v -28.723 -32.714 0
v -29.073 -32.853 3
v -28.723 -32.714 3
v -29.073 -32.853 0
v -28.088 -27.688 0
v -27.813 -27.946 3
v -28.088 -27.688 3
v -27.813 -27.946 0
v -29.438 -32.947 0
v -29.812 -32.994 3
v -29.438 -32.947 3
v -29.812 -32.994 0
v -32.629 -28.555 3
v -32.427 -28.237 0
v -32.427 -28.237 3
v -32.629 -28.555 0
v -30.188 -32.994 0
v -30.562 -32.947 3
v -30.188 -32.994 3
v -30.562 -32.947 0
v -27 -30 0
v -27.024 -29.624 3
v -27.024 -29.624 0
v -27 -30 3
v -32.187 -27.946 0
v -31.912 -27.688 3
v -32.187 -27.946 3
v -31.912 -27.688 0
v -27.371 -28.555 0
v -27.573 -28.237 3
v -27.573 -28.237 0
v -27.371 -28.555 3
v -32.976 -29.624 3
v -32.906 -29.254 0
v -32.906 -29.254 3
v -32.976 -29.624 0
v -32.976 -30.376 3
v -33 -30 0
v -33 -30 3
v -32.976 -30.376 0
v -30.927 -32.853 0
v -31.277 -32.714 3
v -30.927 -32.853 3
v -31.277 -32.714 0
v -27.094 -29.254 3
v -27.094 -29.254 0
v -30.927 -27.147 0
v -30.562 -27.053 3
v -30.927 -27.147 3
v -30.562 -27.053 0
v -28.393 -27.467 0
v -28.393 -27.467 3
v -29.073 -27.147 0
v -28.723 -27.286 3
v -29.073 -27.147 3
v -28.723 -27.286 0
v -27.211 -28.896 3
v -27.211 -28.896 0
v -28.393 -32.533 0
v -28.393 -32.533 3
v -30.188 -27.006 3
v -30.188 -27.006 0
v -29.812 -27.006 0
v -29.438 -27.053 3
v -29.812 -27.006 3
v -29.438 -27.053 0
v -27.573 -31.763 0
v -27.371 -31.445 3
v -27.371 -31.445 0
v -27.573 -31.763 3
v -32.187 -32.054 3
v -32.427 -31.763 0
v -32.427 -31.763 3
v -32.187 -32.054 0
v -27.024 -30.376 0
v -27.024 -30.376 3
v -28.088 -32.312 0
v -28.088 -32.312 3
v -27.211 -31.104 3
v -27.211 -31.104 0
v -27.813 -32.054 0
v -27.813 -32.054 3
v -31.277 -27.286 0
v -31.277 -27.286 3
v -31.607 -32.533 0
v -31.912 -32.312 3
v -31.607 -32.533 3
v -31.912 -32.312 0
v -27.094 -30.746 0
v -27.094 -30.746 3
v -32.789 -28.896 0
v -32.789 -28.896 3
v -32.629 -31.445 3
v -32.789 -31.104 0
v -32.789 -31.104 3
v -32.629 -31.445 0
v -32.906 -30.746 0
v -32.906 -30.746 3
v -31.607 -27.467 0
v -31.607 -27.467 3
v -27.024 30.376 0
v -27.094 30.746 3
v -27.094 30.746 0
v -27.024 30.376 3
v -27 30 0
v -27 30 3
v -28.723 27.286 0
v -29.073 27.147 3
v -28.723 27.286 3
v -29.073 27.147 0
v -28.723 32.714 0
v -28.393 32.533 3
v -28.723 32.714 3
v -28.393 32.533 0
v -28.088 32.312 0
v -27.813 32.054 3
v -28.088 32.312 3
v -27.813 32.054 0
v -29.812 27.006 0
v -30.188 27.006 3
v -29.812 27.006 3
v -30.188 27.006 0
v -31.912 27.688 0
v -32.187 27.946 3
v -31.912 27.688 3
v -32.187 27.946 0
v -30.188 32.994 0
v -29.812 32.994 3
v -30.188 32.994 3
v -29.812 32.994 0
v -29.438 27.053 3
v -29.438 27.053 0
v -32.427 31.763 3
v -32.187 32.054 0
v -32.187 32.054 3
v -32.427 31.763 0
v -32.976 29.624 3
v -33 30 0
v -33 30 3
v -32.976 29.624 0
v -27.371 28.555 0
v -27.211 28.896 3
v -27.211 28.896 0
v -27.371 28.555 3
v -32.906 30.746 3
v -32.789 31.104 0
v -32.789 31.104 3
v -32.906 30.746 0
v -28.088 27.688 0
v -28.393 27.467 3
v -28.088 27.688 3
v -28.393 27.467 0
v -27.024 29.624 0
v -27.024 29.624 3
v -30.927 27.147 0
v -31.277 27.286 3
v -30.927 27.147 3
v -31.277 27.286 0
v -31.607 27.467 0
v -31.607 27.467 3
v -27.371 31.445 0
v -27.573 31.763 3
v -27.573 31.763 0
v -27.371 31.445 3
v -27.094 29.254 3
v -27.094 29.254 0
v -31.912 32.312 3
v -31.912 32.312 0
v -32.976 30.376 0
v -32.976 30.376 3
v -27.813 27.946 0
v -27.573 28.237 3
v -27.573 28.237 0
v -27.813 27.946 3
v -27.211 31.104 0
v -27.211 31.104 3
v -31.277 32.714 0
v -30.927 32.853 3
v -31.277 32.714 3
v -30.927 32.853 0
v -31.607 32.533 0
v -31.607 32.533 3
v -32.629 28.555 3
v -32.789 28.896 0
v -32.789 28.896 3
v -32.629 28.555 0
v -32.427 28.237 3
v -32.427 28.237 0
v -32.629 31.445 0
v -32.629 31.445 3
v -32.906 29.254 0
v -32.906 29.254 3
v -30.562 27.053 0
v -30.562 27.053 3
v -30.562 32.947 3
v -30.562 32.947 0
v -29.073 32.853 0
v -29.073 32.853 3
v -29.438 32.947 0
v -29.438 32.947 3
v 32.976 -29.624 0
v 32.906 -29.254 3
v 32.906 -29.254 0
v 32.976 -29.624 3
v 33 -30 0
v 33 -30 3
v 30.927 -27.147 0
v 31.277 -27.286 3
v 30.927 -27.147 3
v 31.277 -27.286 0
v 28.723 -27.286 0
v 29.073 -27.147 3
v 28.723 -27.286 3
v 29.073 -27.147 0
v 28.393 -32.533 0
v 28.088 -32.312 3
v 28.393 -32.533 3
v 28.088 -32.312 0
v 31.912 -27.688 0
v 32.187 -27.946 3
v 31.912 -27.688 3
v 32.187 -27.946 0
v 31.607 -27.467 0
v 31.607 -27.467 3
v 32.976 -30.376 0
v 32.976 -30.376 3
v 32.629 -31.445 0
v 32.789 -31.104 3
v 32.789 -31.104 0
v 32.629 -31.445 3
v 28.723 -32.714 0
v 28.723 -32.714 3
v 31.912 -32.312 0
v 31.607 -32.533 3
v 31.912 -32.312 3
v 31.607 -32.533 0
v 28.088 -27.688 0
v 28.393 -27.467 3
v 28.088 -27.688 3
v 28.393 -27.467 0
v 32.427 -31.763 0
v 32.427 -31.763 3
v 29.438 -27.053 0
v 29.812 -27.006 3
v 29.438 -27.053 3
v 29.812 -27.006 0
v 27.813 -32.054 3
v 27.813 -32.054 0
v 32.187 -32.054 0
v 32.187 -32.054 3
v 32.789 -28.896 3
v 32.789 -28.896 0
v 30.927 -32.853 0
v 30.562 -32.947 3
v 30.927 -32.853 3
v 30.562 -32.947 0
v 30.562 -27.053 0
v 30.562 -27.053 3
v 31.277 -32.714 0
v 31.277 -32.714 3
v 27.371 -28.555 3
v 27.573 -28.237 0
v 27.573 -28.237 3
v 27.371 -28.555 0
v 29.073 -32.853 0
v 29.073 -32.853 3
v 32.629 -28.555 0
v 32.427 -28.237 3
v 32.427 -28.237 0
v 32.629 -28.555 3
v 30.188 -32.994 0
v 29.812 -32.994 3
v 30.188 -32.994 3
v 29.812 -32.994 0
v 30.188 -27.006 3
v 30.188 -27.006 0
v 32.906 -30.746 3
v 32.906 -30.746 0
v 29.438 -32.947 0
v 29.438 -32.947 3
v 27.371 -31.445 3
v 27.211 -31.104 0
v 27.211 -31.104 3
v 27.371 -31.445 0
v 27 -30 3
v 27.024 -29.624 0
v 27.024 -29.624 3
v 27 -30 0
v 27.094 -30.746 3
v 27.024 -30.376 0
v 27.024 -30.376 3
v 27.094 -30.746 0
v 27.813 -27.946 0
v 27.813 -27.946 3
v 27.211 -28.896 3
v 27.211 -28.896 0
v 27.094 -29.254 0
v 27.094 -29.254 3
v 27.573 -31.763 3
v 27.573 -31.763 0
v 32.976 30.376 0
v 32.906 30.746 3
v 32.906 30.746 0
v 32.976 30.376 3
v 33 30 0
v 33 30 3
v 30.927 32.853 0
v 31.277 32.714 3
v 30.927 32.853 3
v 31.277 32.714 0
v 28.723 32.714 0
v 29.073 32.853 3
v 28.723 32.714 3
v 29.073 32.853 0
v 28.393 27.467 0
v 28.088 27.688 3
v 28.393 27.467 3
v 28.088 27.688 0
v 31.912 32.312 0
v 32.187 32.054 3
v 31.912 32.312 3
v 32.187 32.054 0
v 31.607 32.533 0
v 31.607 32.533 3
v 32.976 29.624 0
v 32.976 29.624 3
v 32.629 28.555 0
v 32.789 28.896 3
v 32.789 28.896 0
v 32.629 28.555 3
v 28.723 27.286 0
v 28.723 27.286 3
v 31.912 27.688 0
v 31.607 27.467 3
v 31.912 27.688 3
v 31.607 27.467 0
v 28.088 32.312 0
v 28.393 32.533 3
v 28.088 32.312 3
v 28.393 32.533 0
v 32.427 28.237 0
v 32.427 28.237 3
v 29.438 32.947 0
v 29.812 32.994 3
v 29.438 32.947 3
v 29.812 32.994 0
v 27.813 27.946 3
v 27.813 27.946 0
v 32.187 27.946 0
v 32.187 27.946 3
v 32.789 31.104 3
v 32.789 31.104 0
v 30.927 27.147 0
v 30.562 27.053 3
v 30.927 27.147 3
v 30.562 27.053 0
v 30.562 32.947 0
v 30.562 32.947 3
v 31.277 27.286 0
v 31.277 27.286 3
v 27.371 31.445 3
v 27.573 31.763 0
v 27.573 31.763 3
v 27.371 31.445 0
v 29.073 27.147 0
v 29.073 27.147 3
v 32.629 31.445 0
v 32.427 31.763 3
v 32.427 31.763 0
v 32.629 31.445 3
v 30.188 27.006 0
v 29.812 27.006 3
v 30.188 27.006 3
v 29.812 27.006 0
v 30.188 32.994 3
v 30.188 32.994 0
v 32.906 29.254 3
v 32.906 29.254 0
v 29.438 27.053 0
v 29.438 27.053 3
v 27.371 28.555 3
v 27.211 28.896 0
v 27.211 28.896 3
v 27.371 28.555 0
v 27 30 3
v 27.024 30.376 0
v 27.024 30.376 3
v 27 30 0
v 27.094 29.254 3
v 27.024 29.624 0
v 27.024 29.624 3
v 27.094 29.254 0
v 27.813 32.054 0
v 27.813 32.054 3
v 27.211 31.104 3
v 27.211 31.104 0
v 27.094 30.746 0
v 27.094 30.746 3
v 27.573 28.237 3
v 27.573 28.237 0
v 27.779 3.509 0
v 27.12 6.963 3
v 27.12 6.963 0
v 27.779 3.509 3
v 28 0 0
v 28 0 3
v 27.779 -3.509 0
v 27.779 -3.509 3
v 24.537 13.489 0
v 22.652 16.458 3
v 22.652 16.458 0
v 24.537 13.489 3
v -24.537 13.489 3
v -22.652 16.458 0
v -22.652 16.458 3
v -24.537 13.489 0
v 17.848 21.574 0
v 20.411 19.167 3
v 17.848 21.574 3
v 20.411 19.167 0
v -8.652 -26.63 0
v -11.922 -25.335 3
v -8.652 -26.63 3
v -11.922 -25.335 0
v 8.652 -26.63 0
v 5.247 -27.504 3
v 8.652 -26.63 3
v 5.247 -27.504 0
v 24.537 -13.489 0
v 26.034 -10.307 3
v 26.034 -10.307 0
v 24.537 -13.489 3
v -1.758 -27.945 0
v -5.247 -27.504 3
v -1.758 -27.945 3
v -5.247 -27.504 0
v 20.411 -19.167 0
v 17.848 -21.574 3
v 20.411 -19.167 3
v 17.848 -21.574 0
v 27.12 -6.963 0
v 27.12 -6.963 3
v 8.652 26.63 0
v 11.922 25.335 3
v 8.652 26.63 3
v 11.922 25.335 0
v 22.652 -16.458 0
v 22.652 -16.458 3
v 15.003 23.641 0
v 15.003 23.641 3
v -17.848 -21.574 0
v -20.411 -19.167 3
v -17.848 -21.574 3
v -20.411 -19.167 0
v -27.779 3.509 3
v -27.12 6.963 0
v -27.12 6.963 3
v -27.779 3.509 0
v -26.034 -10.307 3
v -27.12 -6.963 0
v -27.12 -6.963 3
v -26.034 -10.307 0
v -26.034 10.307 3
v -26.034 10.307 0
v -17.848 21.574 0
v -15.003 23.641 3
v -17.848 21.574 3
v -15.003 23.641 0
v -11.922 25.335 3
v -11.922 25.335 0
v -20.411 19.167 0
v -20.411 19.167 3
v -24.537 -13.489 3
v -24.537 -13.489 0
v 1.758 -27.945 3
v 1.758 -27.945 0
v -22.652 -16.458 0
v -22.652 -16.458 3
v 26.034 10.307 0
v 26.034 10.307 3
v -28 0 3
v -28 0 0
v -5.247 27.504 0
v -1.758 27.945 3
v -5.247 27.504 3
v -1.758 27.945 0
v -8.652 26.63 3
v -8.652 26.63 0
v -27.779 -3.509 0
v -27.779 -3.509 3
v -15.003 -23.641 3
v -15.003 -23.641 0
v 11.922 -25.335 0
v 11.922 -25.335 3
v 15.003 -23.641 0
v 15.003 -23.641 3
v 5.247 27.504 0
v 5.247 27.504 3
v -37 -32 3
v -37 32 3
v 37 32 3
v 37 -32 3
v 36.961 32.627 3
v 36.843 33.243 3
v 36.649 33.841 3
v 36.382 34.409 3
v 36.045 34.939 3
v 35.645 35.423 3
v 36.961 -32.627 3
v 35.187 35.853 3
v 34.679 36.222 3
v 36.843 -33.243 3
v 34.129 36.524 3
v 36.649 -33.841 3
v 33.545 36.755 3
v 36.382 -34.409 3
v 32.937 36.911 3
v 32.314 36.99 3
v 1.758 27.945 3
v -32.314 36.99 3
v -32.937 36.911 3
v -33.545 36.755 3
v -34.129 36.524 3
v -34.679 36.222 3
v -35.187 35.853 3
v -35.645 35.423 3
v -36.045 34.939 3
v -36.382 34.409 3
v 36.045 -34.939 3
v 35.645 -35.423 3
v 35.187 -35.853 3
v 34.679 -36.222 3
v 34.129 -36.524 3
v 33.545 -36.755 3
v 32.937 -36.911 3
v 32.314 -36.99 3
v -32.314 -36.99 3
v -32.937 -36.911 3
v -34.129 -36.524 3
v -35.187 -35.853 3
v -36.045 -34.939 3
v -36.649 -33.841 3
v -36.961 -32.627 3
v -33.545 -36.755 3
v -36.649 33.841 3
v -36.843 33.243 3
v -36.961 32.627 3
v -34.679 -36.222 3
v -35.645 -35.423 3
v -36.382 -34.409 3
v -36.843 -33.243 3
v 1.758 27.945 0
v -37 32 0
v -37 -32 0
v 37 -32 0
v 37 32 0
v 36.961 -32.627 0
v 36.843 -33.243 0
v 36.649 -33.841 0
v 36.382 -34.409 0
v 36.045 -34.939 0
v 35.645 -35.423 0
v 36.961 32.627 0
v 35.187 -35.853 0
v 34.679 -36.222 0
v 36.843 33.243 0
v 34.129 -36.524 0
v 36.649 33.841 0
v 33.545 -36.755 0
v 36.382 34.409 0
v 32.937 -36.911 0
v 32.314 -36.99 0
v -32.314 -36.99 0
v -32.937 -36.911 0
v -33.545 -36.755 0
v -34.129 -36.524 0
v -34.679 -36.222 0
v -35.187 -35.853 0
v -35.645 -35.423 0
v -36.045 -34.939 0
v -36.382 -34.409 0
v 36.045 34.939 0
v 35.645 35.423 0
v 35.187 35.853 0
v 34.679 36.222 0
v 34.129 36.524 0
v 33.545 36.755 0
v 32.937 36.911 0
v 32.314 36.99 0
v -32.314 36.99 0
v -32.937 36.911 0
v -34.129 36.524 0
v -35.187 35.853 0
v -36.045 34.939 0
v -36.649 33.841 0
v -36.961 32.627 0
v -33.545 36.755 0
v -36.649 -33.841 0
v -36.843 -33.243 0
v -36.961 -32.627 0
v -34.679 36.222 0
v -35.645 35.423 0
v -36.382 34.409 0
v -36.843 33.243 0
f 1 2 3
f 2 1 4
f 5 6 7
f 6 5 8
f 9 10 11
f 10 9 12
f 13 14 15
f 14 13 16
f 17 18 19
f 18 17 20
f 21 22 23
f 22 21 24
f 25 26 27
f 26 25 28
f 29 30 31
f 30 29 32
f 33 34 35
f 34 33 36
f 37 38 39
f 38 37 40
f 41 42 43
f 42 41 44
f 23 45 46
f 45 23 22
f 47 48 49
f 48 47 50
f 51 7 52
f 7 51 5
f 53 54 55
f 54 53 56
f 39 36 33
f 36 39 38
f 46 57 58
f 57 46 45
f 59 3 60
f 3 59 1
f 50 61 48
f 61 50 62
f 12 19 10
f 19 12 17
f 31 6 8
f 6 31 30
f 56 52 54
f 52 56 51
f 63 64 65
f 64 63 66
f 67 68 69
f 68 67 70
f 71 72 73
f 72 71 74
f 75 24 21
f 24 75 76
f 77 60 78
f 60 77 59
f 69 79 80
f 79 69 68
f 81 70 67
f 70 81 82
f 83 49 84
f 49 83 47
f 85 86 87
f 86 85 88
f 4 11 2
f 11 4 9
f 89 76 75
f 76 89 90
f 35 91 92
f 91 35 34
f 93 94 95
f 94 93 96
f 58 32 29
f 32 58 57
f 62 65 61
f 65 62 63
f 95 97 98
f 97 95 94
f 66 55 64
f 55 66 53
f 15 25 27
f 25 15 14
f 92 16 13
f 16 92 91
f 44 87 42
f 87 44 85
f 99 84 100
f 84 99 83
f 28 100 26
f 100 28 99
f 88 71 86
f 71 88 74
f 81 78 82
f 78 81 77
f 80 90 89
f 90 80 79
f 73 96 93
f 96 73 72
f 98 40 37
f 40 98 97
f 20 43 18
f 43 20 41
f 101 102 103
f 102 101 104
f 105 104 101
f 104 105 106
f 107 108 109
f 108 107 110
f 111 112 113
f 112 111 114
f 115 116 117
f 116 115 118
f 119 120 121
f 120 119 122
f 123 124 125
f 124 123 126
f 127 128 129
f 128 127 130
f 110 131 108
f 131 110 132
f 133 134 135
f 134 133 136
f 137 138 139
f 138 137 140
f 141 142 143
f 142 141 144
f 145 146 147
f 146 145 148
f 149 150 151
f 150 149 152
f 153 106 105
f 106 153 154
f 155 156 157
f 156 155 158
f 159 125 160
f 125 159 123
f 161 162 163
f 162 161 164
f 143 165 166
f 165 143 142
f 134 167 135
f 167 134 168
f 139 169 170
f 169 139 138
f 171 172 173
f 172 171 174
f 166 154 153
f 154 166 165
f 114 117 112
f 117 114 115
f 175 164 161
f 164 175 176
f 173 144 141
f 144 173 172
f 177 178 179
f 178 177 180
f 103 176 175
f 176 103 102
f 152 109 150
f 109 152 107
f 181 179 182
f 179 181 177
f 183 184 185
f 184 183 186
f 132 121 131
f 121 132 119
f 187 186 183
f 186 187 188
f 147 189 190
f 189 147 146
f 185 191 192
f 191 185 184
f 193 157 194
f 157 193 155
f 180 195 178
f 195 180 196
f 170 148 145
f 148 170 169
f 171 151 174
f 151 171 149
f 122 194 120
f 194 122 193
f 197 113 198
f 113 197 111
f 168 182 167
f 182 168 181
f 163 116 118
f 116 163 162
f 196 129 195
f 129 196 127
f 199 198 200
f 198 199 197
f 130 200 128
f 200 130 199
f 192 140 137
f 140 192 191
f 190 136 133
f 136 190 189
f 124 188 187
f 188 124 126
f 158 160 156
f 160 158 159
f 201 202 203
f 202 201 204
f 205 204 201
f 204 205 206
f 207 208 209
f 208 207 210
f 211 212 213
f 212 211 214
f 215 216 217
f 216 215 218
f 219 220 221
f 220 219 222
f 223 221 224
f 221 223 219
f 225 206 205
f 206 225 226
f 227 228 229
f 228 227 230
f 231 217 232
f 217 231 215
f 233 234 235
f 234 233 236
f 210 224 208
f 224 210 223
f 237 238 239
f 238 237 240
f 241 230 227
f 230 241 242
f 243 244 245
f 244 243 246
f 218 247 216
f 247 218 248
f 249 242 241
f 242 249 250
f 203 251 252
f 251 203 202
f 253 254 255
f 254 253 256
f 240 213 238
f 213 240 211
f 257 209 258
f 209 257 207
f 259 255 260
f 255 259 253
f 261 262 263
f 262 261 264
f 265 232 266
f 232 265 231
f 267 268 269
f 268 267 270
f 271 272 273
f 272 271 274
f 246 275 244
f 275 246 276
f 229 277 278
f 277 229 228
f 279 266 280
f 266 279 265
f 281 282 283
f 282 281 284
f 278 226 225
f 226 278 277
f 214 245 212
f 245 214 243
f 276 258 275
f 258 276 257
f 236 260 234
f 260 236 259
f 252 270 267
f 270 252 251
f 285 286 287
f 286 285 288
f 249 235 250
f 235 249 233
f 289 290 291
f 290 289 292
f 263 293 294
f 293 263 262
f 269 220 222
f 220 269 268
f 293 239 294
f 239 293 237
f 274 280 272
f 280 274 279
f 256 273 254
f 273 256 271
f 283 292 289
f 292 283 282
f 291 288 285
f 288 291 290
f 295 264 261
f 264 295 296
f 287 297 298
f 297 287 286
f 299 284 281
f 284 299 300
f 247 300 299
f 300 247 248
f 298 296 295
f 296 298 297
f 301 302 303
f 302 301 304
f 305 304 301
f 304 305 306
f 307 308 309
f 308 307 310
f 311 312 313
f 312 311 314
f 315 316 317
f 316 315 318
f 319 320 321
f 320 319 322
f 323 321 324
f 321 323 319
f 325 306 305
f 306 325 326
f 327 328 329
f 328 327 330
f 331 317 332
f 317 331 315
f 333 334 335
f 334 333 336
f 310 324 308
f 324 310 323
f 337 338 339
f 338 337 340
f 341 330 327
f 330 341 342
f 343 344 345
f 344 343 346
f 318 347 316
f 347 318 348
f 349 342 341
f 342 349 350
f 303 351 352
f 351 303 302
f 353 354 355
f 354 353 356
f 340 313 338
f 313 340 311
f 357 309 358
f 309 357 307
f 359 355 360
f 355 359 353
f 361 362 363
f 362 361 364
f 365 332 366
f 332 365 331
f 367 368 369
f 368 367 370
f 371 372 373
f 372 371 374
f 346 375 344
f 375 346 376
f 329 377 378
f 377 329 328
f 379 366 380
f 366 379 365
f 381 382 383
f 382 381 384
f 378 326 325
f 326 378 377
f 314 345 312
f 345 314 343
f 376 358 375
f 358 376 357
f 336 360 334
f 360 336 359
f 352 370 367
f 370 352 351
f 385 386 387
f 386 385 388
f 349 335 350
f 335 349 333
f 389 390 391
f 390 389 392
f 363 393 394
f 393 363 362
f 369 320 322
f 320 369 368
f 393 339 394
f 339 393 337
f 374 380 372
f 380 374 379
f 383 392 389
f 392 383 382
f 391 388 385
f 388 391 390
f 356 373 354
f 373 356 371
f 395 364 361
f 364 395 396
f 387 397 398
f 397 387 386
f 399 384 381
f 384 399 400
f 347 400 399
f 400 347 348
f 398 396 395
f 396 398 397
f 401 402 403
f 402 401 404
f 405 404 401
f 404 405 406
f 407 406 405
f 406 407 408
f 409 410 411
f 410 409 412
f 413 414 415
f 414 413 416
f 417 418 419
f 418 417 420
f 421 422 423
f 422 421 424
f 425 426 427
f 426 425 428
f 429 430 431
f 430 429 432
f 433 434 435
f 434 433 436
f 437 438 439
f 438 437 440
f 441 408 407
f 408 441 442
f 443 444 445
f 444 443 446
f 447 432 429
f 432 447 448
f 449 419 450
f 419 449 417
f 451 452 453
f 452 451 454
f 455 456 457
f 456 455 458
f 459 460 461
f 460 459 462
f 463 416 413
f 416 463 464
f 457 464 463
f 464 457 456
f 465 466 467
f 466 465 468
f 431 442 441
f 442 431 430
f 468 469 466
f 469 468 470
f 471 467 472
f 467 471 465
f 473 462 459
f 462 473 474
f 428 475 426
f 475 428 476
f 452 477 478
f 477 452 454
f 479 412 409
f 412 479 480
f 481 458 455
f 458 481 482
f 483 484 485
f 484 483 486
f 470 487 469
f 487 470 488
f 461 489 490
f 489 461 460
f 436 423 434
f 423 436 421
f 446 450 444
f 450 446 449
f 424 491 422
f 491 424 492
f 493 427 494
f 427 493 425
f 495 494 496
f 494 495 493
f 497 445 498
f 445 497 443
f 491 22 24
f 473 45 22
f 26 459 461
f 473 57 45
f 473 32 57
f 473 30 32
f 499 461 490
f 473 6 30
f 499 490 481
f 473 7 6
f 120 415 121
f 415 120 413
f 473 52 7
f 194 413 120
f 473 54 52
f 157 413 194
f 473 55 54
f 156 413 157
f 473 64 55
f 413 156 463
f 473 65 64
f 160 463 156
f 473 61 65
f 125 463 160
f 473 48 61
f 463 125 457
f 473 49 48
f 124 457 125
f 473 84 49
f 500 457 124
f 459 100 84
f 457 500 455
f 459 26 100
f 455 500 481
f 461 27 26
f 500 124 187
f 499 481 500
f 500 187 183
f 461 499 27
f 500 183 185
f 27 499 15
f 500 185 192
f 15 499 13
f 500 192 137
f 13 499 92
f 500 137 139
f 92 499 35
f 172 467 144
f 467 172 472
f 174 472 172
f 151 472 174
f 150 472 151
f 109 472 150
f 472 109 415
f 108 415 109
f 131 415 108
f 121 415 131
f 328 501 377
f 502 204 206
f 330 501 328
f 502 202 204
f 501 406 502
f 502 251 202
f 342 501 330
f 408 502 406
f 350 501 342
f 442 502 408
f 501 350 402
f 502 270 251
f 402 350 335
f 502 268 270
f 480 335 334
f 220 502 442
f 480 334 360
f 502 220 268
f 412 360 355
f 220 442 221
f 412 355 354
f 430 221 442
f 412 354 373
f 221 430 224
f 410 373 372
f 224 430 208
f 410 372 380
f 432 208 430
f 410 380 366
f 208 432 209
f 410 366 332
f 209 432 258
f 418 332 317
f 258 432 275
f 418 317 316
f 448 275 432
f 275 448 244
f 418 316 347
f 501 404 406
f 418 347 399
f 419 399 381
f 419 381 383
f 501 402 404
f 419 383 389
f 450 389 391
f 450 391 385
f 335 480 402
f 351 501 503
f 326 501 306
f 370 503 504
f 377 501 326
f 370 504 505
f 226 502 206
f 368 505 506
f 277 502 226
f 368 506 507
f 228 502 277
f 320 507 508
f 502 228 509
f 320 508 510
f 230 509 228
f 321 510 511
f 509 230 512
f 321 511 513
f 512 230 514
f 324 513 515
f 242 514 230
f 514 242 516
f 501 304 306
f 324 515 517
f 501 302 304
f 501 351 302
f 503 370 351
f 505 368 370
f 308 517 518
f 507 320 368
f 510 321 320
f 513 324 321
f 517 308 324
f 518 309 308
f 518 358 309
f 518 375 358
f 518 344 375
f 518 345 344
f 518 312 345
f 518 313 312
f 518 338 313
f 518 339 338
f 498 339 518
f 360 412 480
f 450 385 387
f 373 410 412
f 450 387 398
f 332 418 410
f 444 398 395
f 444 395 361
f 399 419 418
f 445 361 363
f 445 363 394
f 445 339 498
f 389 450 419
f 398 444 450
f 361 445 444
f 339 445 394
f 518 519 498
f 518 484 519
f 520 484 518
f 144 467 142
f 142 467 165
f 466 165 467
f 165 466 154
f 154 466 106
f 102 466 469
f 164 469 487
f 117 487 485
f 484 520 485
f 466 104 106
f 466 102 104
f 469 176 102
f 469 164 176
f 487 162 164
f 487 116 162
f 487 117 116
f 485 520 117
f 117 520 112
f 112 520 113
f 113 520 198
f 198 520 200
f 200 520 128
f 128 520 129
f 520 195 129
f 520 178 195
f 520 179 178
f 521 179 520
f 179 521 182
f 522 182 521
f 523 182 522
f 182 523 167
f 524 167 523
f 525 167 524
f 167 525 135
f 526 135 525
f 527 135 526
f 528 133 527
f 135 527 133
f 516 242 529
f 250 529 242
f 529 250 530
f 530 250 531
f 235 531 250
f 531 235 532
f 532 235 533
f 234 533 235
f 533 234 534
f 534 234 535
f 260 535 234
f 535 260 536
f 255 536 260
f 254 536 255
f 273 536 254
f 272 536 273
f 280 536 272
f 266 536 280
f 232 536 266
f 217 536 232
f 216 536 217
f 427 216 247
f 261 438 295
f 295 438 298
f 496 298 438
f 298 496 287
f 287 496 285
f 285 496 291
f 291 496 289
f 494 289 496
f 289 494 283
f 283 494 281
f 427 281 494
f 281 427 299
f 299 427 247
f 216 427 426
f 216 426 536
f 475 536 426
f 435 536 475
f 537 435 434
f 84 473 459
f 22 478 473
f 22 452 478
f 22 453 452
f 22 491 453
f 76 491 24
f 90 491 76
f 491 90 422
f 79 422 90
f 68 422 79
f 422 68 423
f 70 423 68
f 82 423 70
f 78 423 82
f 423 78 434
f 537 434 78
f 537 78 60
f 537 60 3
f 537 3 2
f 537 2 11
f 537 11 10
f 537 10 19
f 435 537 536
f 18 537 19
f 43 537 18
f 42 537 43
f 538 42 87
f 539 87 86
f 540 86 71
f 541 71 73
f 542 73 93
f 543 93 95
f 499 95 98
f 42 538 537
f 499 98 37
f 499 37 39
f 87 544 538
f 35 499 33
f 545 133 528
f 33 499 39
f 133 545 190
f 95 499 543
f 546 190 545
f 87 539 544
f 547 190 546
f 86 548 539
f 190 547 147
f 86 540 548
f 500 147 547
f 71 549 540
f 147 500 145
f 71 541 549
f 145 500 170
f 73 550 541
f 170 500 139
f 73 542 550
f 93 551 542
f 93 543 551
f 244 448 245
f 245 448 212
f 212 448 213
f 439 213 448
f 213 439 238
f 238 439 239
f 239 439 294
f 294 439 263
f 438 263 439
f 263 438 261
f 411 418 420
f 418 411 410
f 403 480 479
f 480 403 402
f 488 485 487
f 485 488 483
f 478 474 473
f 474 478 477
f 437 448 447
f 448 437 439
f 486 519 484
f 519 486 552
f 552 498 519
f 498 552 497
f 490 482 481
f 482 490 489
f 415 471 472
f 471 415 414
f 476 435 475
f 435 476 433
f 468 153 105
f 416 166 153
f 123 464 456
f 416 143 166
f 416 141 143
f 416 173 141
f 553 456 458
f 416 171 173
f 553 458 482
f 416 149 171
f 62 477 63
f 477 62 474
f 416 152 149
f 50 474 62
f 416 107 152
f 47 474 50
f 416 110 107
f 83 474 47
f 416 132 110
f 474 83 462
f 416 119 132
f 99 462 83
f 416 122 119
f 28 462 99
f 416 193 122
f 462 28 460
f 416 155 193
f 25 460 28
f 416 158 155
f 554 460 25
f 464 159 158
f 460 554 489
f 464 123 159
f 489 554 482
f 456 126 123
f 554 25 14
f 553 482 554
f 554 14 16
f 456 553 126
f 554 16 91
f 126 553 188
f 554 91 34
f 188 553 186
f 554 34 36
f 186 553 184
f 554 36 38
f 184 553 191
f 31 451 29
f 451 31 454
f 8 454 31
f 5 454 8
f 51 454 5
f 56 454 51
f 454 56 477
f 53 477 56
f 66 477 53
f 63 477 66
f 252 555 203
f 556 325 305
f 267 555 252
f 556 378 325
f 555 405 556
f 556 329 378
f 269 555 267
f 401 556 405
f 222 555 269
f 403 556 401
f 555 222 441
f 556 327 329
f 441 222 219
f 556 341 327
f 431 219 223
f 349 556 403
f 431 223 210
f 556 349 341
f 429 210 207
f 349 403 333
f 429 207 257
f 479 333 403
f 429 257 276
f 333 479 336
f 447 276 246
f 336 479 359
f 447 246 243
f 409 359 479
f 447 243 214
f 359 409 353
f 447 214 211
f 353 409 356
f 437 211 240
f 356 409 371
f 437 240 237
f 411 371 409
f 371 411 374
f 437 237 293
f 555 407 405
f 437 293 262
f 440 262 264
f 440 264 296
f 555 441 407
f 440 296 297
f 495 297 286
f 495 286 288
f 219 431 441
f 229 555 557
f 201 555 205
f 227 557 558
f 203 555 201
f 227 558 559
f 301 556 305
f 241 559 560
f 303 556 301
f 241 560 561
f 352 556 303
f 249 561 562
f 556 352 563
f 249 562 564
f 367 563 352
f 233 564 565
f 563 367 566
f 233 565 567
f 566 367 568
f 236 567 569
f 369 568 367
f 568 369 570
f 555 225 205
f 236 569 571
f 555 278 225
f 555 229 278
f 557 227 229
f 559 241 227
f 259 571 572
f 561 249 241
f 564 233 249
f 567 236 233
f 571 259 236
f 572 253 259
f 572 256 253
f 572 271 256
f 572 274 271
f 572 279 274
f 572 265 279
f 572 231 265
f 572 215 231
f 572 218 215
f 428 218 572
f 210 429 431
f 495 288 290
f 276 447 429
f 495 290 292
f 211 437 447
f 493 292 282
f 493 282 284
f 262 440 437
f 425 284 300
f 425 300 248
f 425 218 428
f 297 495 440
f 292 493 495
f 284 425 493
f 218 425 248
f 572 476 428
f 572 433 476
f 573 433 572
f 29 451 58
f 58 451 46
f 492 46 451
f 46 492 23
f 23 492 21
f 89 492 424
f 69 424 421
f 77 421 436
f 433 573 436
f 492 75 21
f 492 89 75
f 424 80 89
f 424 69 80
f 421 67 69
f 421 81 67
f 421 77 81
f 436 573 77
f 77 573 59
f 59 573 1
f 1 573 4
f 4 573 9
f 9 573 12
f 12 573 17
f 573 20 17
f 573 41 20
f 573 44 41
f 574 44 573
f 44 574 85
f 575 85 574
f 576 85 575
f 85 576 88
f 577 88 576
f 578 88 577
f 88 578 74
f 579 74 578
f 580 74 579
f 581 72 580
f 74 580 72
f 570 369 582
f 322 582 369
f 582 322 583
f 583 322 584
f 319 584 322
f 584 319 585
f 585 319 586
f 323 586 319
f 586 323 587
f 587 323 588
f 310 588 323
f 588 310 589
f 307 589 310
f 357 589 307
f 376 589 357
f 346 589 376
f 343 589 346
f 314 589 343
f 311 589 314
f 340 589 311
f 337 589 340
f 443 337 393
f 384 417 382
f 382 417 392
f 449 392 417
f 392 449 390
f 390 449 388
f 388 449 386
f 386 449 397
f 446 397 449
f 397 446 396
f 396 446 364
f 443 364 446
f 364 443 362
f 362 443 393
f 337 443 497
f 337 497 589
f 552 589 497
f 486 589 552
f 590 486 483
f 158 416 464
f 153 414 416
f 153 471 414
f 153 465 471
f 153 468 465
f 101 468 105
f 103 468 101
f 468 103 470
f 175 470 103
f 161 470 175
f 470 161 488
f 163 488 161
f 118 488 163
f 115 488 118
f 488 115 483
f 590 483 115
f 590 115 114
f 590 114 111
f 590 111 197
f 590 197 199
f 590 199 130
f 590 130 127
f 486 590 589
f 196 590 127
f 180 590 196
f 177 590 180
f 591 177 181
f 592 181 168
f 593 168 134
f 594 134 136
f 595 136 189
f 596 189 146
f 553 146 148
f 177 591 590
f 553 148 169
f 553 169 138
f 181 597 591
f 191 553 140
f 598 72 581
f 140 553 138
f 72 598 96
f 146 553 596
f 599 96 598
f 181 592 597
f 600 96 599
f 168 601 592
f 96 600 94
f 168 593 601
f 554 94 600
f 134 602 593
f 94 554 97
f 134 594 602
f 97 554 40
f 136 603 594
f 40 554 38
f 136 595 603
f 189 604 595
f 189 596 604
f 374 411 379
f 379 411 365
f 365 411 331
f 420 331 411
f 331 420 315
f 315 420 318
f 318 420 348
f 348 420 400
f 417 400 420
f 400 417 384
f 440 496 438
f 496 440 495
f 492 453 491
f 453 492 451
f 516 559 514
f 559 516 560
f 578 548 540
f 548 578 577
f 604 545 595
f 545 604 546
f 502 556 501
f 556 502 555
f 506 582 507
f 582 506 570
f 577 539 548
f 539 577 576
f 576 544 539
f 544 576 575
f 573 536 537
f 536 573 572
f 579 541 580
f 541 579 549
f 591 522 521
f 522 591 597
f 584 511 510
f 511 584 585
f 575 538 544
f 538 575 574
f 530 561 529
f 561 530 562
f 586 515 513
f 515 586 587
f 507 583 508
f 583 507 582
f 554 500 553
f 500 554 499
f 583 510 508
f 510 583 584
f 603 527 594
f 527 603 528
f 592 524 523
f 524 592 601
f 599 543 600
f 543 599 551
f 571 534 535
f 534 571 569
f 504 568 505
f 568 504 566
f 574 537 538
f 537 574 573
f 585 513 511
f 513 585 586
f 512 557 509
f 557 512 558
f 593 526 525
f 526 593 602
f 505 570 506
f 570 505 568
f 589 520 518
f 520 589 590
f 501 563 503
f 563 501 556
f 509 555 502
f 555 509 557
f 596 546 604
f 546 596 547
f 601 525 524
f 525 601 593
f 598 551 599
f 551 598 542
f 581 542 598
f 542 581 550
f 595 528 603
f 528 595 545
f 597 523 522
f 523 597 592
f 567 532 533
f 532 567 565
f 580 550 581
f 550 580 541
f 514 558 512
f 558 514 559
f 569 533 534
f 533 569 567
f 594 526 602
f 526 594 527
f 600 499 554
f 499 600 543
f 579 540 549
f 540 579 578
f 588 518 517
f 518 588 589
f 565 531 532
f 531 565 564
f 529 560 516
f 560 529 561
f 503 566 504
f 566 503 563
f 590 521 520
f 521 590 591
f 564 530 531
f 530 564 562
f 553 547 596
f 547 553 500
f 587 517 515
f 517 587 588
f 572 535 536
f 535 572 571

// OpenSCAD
$fn = 50;


difference() {
	union() {
		hull() {
			translate(v = [-32.0000000000, 32.0000000000, 0]) {
				cylinder(h = 3, r = 5);
			}
			translate(v = [32.0000000000, 32.0000000000, 0]) {
				cylinder(h = 3, r = 5);
			}
			translate(v = [-32.0000000000, -32.0000000000, 0]) {
				cylinder(h = 3, r = 5);
			}
			translate(v = [32.0000000000, -32.0000000000, 0]) {
				cylinder(h = 3, r = 5);
			}
		}
	}
	union() {
		#translate(v = [-30.0000000000, -30.0000000000, -100.0000000000]) {
			cylinder(h = 200, r = 3.0000000000);
		}
		#translate(v = [-30.0000000000, 30.0000000000, -100.0000000000]) {
			cylinder(h = 200, r = 3.0000000000);
		}
		#translate(v = [30.0000000000, -30.0000000000, -100.0000000000]) {
			cylinder(h = 200, r = 3.0000000000);
		}
		#translate(v = [30.0000000000, 30.0000000000, -100.0000000000]) {
			cylinder(h = 200, r = 3.0000000000);
		}
		#cylinder(h = 3, r = 28.0000000000);
	}
}
